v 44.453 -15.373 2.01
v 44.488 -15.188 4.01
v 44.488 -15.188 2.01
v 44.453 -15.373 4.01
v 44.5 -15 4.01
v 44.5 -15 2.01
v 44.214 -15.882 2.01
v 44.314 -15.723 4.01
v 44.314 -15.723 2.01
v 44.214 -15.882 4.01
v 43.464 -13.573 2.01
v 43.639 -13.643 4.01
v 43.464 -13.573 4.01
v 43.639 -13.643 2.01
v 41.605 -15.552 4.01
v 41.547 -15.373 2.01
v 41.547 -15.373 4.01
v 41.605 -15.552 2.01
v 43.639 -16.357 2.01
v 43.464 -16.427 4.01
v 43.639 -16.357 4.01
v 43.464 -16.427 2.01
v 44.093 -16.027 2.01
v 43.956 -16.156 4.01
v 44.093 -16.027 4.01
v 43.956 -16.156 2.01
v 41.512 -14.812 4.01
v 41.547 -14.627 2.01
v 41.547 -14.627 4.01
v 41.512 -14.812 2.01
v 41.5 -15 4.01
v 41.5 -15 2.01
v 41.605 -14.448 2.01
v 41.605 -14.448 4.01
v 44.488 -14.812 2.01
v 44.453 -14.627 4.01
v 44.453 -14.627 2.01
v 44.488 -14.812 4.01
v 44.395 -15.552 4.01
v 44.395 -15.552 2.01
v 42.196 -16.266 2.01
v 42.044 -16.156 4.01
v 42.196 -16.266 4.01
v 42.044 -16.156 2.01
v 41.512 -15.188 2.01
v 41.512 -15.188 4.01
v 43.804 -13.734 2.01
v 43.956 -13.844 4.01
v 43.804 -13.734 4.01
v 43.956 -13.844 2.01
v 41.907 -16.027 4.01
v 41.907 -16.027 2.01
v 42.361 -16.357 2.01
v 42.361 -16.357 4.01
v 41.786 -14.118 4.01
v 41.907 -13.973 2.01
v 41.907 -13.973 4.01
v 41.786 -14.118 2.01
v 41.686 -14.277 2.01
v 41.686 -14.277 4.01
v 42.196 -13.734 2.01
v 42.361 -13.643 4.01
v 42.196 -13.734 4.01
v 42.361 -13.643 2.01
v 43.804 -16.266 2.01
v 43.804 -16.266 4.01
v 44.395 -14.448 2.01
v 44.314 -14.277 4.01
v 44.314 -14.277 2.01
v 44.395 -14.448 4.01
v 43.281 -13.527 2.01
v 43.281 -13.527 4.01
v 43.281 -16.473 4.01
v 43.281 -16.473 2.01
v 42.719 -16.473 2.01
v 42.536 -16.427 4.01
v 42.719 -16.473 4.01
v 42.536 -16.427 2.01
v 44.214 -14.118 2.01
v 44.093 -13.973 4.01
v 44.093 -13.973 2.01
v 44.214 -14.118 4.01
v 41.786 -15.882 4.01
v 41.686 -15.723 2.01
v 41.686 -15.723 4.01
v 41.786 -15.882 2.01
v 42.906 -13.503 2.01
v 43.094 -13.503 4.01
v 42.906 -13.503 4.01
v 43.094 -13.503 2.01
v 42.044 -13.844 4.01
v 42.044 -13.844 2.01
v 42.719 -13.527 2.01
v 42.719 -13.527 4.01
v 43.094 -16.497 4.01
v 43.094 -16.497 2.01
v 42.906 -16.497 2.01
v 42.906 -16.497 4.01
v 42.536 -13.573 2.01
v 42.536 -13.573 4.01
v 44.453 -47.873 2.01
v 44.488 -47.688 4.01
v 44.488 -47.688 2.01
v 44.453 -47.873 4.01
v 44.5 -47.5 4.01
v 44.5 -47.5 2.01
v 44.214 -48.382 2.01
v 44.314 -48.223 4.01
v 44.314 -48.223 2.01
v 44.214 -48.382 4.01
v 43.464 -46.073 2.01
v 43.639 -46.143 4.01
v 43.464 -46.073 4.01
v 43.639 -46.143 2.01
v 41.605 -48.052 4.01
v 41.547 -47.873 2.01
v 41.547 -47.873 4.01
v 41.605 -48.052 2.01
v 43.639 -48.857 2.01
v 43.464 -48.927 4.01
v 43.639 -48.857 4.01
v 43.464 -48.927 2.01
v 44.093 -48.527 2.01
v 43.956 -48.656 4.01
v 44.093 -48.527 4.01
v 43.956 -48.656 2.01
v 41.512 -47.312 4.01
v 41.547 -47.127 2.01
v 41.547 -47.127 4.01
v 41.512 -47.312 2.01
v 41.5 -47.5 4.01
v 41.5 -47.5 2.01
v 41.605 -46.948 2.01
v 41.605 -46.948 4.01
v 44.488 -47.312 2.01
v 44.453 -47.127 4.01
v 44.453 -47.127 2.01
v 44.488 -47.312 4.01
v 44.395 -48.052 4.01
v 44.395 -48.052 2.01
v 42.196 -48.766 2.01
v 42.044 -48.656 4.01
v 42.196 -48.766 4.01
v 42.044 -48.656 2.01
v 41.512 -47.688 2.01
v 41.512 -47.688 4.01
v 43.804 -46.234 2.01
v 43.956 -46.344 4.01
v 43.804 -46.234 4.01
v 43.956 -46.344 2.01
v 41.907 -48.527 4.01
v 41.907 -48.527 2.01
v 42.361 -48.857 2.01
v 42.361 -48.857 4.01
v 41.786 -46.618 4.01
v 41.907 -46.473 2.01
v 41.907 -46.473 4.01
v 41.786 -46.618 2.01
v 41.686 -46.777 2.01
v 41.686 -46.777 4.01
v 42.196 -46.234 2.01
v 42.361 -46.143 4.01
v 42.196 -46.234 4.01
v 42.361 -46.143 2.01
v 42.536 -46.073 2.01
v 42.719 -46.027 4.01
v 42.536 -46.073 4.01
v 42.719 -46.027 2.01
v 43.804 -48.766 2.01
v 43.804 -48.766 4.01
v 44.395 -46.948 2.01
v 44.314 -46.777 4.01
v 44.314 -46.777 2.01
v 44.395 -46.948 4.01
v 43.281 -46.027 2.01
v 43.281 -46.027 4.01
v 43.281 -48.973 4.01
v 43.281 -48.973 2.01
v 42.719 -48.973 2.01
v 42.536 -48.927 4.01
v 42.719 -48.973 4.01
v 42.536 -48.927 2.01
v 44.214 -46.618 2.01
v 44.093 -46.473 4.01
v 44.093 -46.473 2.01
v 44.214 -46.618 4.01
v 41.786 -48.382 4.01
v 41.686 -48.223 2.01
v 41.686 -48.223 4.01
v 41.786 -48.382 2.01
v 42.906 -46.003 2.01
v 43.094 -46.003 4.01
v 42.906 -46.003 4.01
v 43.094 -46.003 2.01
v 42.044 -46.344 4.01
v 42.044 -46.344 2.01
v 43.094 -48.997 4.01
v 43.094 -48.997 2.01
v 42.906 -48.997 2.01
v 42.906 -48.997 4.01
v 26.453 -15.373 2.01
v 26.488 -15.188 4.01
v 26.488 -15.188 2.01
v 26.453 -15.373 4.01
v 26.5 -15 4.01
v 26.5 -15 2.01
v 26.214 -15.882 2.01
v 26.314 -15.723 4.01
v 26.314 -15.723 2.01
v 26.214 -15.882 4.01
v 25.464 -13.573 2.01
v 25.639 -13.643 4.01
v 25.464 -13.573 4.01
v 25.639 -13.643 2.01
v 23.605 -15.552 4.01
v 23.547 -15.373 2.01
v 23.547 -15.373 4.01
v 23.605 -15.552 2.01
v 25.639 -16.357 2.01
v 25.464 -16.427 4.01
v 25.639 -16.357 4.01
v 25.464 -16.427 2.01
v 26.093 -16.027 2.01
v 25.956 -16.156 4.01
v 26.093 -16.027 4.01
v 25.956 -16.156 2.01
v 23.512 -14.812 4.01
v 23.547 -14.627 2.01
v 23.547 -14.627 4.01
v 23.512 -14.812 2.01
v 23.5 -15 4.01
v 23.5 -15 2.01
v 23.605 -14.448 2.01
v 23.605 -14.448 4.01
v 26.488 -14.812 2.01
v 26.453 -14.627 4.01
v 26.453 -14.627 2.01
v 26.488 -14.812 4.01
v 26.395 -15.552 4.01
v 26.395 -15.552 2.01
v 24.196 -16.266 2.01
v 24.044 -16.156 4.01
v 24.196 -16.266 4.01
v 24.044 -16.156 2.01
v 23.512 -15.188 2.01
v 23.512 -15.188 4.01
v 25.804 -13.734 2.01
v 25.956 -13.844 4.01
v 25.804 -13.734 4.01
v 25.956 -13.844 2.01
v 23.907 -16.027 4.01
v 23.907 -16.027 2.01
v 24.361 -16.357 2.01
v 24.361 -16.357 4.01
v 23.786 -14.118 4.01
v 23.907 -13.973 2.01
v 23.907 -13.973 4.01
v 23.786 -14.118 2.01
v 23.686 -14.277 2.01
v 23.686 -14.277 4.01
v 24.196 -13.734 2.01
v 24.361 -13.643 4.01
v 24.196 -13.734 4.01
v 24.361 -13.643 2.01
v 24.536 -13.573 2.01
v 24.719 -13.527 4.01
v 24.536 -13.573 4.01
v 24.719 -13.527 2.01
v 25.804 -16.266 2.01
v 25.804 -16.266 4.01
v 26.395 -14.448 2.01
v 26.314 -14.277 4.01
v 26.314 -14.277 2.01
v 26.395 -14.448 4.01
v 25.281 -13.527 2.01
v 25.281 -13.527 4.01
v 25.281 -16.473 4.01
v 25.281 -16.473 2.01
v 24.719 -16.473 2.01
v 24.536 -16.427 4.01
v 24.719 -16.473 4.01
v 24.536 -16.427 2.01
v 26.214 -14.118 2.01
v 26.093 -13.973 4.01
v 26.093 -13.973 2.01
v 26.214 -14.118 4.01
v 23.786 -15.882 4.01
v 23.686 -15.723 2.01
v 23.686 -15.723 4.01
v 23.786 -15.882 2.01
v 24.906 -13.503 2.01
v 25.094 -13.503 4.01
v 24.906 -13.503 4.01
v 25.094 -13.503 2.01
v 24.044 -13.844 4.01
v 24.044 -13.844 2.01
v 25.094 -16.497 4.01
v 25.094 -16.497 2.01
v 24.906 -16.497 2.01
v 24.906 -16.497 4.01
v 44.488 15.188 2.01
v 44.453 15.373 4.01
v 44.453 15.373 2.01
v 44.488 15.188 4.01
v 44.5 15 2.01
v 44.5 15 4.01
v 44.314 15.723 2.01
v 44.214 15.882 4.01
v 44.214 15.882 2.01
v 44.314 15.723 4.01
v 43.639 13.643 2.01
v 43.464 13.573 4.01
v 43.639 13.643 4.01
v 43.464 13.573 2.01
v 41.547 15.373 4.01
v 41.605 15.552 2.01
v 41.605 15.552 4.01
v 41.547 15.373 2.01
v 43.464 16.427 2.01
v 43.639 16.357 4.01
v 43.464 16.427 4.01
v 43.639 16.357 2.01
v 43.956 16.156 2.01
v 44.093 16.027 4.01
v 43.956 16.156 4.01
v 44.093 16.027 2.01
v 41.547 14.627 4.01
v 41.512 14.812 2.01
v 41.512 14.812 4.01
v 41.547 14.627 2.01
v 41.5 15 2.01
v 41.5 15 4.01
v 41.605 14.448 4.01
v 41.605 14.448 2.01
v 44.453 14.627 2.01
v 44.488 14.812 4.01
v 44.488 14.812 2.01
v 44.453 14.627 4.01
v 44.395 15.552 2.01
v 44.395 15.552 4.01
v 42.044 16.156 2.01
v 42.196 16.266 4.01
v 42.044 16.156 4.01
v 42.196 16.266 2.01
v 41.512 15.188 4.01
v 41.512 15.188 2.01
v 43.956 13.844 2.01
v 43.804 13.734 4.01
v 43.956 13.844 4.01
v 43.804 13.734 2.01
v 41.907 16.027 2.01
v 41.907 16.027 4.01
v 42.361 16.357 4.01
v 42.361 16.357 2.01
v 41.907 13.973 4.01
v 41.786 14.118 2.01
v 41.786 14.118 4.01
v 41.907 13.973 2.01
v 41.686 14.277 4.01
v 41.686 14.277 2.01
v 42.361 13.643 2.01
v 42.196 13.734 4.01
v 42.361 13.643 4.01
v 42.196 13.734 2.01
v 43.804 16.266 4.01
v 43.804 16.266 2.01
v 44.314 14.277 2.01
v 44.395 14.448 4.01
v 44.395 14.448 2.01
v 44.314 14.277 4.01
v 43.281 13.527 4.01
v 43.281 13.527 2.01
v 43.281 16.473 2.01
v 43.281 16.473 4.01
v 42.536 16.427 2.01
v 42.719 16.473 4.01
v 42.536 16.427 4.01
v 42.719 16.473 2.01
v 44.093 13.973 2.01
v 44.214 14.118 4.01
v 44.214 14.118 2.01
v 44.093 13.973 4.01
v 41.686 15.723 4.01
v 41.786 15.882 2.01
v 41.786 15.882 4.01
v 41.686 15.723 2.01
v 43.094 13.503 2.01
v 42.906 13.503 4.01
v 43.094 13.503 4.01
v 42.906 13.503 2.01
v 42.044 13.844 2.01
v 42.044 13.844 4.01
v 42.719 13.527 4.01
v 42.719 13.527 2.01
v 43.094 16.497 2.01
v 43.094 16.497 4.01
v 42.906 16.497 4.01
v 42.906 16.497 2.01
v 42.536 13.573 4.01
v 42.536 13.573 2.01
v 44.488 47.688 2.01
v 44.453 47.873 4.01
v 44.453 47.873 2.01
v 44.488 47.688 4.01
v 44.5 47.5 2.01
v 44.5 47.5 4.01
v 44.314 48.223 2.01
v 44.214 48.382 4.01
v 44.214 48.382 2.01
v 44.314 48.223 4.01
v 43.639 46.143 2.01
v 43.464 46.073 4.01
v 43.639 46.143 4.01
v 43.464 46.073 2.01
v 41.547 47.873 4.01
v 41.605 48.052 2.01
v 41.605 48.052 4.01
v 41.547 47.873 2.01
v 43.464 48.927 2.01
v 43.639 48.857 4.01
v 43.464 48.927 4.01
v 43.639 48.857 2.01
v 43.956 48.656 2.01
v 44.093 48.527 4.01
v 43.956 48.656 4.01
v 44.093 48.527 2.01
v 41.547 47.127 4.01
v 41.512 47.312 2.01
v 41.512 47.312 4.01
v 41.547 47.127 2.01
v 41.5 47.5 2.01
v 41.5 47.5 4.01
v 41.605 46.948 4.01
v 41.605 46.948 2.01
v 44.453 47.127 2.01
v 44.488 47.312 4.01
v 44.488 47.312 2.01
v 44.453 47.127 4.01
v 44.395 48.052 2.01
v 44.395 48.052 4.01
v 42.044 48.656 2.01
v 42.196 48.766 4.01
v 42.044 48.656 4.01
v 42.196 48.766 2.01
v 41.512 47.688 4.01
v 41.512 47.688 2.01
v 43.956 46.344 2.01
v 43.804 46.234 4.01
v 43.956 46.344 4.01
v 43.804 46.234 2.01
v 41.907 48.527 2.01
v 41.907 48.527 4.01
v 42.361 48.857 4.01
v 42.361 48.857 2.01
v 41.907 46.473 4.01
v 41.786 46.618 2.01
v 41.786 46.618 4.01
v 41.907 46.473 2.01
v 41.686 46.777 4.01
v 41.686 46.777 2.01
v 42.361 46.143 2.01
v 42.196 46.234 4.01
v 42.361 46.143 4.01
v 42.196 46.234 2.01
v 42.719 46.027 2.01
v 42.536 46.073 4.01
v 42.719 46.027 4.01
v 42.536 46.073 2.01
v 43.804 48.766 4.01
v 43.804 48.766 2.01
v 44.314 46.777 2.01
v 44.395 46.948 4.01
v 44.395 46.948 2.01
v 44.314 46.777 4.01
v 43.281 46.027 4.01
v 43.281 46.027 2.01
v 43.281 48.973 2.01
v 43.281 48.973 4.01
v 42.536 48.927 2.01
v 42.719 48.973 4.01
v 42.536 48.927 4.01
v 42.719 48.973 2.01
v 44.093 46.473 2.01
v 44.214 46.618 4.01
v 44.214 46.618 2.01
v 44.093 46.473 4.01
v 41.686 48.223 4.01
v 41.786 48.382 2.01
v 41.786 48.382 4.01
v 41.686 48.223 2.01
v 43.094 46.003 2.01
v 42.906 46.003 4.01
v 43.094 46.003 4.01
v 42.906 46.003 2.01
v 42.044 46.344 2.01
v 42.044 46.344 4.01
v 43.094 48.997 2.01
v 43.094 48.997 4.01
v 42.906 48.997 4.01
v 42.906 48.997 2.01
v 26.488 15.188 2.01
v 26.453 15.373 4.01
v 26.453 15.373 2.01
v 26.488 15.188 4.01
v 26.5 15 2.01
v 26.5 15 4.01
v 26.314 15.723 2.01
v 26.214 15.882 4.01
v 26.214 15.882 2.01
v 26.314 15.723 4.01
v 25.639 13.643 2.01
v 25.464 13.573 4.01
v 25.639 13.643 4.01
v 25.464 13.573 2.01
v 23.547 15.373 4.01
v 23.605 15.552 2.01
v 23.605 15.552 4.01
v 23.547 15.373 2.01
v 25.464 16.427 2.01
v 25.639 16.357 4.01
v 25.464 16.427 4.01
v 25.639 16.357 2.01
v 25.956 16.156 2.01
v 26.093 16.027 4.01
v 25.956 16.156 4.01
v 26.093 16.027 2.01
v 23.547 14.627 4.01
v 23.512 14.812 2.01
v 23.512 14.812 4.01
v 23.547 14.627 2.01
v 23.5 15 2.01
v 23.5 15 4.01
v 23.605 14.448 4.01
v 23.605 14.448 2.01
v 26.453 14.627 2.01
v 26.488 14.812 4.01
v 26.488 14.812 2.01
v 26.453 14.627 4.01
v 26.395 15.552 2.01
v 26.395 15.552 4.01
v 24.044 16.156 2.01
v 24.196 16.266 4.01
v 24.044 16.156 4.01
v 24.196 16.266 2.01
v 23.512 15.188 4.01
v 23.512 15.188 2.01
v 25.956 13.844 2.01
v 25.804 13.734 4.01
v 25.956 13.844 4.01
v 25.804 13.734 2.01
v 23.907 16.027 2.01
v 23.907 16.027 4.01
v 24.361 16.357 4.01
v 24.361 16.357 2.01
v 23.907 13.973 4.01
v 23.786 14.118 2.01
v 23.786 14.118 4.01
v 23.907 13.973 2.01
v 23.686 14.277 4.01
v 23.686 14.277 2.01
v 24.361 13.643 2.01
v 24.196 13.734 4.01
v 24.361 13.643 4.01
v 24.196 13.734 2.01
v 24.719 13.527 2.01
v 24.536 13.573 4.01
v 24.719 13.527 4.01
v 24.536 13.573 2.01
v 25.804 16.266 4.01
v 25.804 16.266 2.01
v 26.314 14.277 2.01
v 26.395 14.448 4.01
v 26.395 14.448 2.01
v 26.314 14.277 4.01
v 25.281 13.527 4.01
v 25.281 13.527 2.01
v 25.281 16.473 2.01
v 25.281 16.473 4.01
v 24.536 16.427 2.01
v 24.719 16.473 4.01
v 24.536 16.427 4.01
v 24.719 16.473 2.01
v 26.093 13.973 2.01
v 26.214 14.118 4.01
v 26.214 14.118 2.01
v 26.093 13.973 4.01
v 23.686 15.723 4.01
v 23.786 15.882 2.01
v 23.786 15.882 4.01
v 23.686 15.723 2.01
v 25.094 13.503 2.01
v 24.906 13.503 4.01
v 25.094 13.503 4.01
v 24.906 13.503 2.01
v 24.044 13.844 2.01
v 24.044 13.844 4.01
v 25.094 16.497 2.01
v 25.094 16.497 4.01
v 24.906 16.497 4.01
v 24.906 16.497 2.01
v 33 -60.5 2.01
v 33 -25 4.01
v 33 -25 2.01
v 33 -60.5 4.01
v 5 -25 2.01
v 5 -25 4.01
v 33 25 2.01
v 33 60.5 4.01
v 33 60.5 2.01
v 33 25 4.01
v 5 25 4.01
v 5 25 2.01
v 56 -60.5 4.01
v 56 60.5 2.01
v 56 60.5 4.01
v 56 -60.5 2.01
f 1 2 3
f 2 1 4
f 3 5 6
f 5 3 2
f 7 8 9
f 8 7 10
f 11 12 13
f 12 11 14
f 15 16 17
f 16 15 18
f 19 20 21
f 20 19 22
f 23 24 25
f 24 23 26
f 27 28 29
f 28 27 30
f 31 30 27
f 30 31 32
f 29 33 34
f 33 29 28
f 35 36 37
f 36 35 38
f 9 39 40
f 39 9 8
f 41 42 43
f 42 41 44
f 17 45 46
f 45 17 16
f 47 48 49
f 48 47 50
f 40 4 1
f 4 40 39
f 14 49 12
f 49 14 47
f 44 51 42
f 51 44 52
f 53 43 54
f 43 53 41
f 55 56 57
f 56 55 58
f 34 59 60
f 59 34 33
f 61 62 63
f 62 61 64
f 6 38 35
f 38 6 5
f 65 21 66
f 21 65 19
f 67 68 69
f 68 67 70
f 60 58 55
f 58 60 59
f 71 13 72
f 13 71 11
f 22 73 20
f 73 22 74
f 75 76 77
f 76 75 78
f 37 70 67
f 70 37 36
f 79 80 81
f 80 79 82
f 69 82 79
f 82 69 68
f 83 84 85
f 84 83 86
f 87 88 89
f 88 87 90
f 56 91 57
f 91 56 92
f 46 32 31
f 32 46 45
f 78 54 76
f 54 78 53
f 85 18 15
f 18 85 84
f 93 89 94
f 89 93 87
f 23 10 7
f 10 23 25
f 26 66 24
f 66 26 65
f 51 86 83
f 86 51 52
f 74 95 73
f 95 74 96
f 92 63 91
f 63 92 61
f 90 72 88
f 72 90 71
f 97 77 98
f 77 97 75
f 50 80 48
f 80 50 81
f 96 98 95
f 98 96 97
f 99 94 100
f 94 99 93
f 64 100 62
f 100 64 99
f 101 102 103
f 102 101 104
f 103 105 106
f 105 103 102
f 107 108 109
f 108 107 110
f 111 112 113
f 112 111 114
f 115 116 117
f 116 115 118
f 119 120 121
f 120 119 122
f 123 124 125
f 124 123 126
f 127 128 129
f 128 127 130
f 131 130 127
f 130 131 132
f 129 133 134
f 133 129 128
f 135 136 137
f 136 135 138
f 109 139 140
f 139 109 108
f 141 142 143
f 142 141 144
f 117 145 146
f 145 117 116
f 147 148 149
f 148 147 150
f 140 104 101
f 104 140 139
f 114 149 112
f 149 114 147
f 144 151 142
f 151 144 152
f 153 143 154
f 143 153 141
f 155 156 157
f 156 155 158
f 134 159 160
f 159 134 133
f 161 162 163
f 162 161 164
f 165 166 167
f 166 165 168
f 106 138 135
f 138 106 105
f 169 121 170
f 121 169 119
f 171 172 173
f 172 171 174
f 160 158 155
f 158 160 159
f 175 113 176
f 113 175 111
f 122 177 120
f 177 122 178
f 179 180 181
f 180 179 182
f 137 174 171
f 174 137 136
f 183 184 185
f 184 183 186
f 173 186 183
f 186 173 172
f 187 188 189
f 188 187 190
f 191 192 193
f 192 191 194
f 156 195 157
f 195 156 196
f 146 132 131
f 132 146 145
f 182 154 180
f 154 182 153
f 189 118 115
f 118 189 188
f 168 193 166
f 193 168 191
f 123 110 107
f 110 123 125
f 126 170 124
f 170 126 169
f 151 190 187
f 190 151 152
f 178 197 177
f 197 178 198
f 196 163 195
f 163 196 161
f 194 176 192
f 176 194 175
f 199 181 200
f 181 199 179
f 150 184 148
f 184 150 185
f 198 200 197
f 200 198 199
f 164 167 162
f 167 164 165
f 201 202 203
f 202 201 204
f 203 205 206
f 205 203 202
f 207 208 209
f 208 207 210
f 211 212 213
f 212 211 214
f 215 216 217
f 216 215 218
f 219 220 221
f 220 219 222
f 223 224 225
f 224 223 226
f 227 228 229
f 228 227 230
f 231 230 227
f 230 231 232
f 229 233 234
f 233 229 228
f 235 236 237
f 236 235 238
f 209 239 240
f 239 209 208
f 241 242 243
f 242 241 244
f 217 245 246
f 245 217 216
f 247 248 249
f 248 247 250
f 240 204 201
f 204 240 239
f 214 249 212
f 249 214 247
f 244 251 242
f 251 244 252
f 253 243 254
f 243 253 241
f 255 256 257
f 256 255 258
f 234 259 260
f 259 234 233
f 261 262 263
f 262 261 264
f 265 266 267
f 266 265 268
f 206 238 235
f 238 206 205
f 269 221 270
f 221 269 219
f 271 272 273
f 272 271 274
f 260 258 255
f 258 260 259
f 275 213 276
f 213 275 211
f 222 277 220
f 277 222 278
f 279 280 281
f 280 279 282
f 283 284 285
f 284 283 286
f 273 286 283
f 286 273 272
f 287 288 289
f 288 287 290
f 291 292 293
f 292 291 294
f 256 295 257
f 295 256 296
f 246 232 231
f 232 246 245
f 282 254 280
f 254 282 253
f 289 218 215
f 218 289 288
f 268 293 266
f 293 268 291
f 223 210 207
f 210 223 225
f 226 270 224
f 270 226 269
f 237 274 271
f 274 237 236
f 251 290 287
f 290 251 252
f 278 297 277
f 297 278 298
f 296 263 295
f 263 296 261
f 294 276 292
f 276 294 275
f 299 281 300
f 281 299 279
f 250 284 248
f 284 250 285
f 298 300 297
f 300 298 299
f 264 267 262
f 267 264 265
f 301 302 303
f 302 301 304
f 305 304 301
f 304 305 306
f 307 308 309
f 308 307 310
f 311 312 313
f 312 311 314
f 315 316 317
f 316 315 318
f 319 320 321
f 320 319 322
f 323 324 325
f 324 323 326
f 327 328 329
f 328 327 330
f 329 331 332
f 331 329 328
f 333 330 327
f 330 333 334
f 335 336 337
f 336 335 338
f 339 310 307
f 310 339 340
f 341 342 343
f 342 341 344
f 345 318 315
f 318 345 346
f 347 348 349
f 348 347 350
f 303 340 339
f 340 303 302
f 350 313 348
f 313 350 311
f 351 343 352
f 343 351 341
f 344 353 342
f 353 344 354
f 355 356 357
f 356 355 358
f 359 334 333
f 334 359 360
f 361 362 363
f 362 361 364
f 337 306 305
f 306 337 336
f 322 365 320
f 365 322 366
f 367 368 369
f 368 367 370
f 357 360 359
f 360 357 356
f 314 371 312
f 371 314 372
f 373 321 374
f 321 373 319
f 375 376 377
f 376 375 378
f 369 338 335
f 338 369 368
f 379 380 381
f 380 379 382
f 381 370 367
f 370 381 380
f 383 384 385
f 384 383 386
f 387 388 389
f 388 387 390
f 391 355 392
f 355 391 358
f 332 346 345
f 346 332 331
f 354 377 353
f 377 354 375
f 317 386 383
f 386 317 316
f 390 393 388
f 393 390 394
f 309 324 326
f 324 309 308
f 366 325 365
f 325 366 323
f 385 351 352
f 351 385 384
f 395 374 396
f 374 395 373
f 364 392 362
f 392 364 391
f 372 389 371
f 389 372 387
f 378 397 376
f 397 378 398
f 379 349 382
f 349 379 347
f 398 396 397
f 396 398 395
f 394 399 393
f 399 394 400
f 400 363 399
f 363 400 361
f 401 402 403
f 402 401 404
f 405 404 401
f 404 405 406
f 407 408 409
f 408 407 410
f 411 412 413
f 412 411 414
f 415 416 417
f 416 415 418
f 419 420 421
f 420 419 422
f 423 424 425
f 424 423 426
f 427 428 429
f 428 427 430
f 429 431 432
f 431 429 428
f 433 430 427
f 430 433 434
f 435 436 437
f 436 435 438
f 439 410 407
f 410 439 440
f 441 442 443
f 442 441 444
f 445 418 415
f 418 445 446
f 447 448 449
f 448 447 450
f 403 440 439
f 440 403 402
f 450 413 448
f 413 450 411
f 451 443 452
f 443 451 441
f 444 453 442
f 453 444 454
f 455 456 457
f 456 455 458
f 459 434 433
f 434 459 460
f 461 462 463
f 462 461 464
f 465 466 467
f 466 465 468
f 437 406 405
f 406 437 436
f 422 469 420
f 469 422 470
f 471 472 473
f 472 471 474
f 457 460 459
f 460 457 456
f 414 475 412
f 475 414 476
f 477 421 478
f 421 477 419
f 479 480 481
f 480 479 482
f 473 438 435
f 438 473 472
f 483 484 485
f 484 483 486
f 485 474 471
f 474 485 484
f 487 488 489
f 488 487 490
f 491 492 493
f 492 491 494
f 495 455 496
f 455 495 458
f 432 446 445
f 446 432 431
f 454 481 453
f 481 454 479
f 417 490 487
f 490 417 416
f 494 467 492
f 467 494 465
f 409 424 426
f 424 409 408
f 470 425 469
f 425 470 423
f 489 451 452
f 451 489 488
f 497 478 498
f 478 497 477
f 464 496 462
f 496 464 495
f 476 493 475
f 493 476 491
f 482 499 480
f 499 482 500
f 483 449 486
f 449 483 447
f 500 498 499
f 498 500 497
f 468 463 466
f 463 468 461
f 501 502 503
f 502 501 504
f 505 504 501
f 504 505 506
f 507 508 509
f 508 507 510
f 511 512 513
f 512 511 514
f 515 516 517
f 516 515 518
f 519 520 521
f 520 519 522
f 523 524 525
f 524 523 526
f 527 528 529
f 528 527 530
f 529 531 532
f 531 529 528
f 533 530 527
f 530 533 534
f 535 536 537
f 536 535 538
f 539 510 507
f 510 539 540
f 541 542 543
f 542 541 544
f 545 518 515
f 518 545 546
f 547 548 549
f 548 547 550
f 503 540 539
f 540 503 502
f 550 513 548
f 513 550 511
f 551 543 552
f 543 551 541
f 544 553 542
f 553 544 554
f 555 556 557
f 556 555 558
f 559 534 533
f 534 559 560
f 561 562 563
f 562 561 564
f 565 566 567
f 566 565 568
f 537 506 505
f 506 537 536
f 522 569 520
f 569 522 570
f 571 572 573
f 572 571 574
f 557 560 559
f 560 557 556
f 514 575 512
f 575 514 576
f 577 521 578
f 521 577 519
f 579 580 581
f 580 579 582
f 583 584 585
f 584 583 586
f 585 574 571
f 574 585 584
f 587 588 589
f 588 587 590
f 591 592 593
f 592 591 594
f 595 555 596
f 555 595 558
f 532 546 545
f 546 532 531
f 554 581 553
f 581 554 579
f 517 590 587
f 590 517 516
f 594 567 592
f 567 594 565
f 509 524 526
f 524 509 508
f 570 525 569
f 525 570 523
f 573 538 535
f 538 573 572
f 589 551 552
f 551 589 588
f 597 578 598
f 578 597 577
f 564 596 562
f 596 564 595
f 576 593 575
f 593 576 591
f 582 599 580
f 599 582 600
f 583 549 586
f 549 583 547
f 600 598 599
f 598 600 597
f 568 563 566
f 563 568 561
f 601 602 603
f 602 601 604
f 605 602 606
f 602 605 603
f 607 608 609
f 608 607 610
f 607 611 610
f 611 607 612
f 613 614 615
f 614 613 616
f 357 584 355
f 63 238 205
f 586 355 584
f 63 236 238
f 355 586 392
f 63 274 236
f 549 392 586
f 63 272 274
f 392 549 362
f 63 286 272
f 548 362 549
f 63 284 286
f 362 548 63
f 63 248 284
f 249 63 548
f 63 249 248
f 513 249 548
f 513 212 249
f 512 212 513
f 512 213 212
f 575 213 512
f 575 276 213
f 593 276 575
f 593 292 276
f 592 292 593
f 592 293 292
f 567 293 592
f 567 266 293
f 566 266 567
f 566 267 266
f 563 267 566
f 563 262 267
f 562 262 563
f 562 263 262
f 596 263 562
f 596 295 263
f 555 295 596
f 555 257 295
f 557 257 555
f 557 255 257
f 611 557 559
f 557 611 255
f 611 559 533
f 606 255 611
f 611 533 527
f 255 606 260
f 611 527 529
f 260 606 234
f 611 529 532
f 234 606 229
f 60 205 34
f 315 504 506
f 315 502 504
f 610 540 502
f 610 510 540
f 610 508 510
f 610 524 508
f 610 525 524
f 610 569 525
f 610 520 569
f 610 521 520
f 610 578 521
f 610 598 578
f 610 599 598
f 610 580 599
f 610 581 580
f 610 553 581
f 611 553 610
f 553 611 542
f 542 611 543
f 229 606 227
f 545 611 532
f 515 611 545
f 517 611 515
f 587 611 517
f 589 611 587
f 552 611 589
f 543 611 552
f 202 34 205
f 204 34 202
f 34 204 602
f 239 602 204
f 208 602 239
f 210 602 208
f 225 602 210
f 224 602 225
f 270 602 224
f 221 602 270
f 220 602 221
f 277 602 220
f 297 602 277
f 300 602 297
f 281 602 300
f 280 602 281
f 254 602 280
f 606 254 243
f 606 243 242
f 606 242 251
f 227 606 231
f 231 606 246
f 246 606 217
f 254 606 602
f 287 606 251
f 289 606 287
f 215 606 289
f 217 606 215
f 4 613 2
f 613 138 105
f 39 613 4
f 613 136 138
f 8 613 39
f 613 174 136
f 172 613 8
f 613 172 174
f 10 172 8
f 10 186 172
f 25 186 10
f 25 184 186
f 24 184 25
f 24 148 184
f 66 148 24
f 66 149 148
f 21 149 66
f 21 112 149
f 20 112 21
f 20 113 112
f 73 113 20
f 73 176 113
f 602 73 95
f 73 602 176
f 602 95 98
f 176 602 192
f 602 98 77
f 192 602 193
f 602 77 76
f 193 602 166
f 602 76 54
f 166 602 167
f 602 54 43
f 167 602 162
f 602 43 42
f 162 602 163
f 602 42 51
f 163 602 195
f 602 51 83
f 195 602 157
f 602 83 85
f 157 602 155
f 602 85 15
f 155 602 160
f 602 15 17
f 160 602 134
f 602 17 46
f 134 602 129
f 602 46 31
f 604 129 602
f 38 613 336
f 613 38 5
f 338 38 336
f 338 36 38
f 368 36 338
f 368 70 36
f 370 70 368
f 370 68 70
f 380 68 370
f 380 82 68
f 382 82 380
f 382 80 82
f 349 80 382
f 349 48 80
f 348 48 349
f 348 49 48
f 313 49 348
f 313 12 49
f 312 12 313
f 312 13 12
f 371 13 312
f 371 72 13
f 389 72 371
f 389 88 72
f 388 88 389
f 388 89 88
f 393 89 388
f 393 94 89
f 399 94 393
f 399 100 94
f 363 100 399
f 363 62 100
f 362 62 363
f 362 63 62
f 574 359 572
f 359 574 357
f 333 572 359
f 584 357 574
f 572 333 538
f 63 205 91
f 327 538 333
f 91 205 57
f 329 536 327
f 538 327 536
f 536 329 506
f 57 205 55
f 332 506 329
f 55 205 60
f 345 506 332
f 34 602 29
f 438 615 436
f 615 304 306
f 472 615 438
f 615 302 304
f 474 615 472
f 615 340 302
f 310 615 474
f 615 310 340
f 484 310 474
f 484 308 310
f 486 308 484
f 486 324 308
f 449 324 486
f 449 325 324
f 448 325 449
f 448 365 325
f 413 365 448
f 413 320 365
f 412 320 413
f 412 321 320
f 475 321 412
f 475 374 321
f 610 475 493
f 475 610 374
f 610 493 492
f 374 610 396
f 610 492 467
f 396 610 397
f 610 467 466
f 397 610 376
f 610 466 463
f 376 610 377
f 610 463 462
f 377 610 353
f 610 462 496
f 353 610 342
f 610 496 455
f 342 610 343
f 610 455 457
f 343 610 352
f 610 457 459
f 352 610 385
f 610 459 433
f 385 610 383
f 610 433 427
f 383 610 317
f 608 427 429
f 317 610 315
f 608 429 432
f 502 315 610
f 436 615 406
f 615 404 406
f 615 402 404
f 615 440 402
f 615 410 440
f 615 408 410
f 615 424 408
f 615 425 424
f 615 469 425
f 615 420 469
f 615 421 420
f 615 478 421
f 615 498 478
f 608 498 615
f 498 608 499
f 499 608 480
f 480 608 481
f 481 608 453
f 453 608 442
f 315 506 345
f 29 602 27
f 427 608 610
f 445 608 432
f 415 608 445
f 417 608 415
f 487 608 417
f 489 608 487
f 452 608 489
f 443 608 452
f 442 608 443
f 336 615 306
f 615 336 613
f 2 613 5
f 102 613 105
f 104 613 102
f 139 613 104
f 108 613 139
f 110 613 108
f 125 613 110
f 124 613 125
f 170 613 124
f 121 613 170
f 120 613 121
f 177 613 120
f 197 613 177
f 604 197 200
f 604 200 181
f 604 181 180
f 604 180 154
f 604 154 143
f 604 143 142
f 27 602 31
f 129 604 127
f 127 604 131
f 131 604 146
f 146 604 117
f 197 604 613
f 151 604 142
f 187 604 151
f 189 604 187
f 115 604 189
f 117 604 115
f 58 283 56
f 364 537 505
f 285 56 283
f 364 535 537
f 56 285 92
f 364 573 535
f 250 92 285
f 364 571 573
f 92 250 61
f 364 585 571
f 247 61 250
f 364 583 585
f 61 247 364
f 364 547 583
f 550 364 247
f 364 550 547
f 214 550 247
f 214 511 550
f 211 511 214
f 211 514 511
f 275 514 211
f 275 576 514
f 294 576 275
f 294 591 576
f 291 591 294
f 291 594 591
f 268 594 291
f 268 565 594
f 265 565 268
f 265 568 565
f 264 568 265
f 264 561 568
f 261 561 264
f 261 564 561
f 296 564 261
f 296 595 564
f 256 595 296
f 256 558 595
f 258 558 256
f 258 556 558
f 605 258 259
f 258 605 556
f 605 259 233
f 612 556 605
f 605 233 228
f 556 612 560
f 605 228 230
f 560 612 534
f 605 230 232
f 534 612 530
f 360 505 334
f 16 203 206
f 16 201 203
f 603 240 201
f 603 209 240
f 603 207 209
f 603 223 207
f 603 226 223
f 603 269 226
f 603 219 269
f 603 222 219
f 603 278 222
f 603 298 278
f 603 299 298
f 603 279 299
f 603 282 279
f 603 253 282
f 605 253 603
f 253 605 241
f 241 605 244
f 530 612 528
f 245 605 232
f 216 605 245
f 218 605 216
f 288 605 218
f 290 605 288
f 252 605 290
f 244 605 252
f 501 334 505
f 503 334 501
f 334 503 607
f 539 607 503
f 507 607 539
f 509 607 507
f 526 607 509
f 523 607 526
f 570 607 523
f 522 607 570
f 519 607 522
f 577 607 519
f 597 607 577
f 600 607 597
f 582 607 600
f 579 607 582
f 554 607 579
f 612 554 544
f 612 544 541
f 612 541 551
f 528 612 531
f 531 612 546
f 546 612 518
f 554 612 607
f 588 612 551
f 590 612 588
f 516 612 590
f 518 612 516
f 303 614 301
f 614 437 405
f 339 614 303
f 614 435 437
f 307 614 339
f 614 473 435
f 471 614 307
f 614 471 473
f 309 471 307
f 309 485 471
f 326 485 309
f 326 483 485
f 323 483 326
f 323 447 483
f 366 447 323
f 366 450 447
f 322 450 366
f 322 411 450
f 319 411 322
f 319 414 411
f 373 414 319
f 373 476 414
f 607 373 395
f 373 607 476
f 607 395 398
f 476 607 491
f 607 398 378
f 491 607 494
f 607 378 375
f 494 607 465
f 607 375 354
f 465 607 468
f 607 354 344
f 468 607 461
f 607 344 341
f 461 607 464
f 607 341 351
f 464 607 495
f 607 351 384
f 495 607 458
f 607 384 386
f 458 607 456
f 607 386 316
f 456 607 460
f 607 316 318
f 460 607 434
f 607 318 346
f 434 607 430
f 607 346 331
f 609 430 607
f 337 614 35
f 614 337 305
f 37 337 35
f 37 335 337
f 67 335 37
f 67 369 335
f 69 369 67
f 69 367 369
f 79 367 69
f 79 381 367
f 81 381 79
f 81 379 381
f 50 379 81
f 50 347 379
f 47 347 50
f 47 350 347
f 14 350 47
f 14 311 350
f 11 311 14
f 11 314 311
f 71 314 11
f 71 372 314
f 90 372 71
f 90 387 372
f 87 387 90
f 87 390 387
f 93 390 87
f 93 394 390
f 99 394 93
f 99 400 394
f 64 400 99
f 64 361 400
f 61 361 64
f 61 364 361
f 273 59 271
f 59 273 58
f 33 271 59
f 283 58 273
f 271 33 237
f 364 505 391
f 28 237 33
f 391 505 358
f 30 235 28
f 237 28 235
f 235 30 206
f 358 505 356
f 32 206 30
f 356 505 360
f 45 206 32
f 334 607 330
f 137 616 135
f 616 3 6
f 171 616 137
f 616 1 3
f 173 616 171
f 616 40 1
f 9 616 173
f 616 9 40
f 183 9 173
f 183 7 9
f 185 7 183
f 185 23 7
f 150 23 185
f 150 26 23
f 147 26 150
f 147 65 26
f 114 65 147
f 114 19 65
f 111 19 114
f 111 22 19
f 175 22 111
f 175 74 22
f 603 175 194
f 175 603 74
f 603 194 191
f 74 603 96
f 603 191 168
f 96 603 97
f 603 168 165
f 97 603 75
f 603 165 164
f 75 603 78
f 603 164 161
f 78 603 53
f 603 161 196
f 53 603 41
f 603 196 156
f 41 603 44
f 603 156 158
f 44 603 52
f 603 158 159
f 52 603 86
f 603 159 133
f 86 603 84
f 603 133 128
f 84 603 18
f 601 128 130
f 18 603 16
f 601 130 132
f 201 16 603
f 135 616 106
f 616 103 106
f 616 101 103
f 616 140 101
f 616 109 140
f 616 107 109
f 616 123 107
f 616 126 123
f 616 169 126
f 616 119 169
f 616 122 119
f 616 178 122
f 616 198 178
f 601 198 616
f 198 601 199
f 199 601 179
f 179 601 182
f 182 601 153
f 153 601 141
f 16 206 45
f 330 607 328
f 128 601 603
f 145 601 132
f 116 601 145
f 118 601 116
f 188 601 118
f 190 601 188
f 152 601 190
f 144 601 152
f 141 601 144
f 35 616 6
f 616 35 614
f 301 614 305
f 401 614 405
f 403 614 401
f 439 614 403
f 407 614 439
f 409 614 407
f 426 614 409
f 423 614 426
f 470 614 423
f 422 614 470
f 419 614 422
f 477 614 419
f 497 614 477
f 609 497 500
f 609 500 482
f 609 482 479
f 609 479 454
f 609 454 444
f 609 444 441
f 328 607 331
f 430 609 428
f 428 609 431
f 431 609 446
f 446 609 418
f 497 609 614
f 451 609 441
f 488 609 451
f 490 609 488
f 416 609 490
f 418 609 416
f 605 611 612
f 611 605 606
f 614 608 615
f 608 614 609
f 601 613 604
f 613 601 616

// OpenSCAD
module box (sizes, centering=[1, 1, 1], extra_negative=[0, 0, 0]) {
    translate ([
        -sizes[0]*centering[0]/2-extra_negative[0],
        -sizes[1]*centering[1]/2-extra_negative[1],
        -sizes[2]*centering[2]/2-extra_negative[2],
    ]) {
        cube ([
            sizes[0]+extra_negative[0],
            sizes[1]+extra_negative[1],
            sizes[2]+extra_negative[2],
        ]);
    }
}

BOX_Y = 121;    // incl.tol
BOX_X = 56;     // incl.tol
BOX_Z = 27;     // no tol

ZKOS = 5;

HINGE_DZ = 3;

EPS = 0.01;
$fn=50;

module groove (w, y, z) {
    translate ([0, y, -z]) {
        translate ([-1, 0, 0]) box ([100, w, z+EPS], [0, 1, 0]);
        children ();
    }
}

module screw_pos () {
    for (ys=[-1, 1]) scale ([1, ys, 1]) {
        for (x=[BOX_X/2 + 15, 25]) for (y=[15,40+15/2]) {
            translate ([x, y, 0]) children ();
        }
    }
}

module screw_hole () {
    translate ([0, 0, -BOX_Z+EPS]) cylinder (12, r=5/2-.25);
    translate ([0, 0, -50]) cylinder (100, r=3/2+.25);
}

module main () {
    difference () {
        union () {
            box ([BOX_X, BOX_Y, BOX_Z], [0, 1, 2]);
            screw_pos () {
                cylinder (2, r=8/2);
            }
        }

        translate ([0, 0, -ZKOS]) rotate ([0, -45, 0]) {
            box ([10, BOX_Y+EPS, 10], [0, 1, 0]);
        }

        for (ys=[-1, 1]) scale ([1, ys, 1]) {
            groove (4+.5, 0, 3+.5);

            D1 = 36.5 - 4/2 - 5/2;
            groove (5+1.5, D1, 2.5+.5);

            D2 = D1 + 2;
            groove (1.5+1, D2, 6+1) {
                translate ([0, 0, -24+7]) rotate ([0, -45, 0]) {
                    box ([30, 1.5+1, 30], [0, 1, 0]);
                }
                translate ([BOX_X, 0, -24+7]) rotate ([0, -45, 0]) {
                    box ([30, 1.5+1, 30], [0, 1, 0]);
                }
            }
            translate ([BOX_X-4, D1+1, -7]) {
                box ([4+EPS, 100, 100], [0, 0, 0]);
            }
            translate ([25, 40-1, -HINGE_DZ]) box ([13+2, 15+2, 12], [1, 0, 0]);
        }
        screw_pos () {
            screw_hole ();
        }

    }
}

module top_plate () {
    difference () {
        translate ([ZKOS, 0, EPS]) box ([BOX_X-ZKOS, BOX_Y, 2], [0, 1, 0]);
        screw_pos () {
            cylinder (100, r=3/2);
        }
        for (y=[-1, 1]) scale ([1, y, 1]) {
            translate ([25, 25, 0]) box ([13+3, 50, 12], [1, 0, 0]);
            translate ([25, 25, 0]) box ([50, 50, 12], [2, 0, 0]);
        }
    }
}

module hinge () {
    DZ = HINGE_DZ;
    XZ = .5;
    translate ([25, 0, 0]) difference () {
        for (y=[1]) scale ([1, y, 1]) {
            translate ([0, 40, -DZ]) box ([13, 15, 12+DZ+XZ], [1, 0, 0]);
        }
        translate ([0, 100, 10-8/2+XZ]) {
            rotate ([90, 0, 0]) cylinder (200, r=8/2+.5);
            RM = 8;
            hull () {
                box ([EPS, 200, RM], [1, 2, 0]);
                translate ([0, 0, RM*1.2]) box ([RM*2, 200, 100], [1, 2, 0]);
            }
        }
        for (y=[-1, 1]) scale ([1, y, 1]) translate ([0, 40+15/2, 0]) {
            translate ([0, 0, -BOX_Z-EPS]) cylinder (50, r=3/2+.25);
            translate ([0, 0, -1+XZ]) cylinder (50, r=5.5/2+.25);
        }
    }
}

//main ();
translate ([0, 0, 2]) color ([1,.2,0]) top_plate ();
//color ([0,1,1]) hinge ();
